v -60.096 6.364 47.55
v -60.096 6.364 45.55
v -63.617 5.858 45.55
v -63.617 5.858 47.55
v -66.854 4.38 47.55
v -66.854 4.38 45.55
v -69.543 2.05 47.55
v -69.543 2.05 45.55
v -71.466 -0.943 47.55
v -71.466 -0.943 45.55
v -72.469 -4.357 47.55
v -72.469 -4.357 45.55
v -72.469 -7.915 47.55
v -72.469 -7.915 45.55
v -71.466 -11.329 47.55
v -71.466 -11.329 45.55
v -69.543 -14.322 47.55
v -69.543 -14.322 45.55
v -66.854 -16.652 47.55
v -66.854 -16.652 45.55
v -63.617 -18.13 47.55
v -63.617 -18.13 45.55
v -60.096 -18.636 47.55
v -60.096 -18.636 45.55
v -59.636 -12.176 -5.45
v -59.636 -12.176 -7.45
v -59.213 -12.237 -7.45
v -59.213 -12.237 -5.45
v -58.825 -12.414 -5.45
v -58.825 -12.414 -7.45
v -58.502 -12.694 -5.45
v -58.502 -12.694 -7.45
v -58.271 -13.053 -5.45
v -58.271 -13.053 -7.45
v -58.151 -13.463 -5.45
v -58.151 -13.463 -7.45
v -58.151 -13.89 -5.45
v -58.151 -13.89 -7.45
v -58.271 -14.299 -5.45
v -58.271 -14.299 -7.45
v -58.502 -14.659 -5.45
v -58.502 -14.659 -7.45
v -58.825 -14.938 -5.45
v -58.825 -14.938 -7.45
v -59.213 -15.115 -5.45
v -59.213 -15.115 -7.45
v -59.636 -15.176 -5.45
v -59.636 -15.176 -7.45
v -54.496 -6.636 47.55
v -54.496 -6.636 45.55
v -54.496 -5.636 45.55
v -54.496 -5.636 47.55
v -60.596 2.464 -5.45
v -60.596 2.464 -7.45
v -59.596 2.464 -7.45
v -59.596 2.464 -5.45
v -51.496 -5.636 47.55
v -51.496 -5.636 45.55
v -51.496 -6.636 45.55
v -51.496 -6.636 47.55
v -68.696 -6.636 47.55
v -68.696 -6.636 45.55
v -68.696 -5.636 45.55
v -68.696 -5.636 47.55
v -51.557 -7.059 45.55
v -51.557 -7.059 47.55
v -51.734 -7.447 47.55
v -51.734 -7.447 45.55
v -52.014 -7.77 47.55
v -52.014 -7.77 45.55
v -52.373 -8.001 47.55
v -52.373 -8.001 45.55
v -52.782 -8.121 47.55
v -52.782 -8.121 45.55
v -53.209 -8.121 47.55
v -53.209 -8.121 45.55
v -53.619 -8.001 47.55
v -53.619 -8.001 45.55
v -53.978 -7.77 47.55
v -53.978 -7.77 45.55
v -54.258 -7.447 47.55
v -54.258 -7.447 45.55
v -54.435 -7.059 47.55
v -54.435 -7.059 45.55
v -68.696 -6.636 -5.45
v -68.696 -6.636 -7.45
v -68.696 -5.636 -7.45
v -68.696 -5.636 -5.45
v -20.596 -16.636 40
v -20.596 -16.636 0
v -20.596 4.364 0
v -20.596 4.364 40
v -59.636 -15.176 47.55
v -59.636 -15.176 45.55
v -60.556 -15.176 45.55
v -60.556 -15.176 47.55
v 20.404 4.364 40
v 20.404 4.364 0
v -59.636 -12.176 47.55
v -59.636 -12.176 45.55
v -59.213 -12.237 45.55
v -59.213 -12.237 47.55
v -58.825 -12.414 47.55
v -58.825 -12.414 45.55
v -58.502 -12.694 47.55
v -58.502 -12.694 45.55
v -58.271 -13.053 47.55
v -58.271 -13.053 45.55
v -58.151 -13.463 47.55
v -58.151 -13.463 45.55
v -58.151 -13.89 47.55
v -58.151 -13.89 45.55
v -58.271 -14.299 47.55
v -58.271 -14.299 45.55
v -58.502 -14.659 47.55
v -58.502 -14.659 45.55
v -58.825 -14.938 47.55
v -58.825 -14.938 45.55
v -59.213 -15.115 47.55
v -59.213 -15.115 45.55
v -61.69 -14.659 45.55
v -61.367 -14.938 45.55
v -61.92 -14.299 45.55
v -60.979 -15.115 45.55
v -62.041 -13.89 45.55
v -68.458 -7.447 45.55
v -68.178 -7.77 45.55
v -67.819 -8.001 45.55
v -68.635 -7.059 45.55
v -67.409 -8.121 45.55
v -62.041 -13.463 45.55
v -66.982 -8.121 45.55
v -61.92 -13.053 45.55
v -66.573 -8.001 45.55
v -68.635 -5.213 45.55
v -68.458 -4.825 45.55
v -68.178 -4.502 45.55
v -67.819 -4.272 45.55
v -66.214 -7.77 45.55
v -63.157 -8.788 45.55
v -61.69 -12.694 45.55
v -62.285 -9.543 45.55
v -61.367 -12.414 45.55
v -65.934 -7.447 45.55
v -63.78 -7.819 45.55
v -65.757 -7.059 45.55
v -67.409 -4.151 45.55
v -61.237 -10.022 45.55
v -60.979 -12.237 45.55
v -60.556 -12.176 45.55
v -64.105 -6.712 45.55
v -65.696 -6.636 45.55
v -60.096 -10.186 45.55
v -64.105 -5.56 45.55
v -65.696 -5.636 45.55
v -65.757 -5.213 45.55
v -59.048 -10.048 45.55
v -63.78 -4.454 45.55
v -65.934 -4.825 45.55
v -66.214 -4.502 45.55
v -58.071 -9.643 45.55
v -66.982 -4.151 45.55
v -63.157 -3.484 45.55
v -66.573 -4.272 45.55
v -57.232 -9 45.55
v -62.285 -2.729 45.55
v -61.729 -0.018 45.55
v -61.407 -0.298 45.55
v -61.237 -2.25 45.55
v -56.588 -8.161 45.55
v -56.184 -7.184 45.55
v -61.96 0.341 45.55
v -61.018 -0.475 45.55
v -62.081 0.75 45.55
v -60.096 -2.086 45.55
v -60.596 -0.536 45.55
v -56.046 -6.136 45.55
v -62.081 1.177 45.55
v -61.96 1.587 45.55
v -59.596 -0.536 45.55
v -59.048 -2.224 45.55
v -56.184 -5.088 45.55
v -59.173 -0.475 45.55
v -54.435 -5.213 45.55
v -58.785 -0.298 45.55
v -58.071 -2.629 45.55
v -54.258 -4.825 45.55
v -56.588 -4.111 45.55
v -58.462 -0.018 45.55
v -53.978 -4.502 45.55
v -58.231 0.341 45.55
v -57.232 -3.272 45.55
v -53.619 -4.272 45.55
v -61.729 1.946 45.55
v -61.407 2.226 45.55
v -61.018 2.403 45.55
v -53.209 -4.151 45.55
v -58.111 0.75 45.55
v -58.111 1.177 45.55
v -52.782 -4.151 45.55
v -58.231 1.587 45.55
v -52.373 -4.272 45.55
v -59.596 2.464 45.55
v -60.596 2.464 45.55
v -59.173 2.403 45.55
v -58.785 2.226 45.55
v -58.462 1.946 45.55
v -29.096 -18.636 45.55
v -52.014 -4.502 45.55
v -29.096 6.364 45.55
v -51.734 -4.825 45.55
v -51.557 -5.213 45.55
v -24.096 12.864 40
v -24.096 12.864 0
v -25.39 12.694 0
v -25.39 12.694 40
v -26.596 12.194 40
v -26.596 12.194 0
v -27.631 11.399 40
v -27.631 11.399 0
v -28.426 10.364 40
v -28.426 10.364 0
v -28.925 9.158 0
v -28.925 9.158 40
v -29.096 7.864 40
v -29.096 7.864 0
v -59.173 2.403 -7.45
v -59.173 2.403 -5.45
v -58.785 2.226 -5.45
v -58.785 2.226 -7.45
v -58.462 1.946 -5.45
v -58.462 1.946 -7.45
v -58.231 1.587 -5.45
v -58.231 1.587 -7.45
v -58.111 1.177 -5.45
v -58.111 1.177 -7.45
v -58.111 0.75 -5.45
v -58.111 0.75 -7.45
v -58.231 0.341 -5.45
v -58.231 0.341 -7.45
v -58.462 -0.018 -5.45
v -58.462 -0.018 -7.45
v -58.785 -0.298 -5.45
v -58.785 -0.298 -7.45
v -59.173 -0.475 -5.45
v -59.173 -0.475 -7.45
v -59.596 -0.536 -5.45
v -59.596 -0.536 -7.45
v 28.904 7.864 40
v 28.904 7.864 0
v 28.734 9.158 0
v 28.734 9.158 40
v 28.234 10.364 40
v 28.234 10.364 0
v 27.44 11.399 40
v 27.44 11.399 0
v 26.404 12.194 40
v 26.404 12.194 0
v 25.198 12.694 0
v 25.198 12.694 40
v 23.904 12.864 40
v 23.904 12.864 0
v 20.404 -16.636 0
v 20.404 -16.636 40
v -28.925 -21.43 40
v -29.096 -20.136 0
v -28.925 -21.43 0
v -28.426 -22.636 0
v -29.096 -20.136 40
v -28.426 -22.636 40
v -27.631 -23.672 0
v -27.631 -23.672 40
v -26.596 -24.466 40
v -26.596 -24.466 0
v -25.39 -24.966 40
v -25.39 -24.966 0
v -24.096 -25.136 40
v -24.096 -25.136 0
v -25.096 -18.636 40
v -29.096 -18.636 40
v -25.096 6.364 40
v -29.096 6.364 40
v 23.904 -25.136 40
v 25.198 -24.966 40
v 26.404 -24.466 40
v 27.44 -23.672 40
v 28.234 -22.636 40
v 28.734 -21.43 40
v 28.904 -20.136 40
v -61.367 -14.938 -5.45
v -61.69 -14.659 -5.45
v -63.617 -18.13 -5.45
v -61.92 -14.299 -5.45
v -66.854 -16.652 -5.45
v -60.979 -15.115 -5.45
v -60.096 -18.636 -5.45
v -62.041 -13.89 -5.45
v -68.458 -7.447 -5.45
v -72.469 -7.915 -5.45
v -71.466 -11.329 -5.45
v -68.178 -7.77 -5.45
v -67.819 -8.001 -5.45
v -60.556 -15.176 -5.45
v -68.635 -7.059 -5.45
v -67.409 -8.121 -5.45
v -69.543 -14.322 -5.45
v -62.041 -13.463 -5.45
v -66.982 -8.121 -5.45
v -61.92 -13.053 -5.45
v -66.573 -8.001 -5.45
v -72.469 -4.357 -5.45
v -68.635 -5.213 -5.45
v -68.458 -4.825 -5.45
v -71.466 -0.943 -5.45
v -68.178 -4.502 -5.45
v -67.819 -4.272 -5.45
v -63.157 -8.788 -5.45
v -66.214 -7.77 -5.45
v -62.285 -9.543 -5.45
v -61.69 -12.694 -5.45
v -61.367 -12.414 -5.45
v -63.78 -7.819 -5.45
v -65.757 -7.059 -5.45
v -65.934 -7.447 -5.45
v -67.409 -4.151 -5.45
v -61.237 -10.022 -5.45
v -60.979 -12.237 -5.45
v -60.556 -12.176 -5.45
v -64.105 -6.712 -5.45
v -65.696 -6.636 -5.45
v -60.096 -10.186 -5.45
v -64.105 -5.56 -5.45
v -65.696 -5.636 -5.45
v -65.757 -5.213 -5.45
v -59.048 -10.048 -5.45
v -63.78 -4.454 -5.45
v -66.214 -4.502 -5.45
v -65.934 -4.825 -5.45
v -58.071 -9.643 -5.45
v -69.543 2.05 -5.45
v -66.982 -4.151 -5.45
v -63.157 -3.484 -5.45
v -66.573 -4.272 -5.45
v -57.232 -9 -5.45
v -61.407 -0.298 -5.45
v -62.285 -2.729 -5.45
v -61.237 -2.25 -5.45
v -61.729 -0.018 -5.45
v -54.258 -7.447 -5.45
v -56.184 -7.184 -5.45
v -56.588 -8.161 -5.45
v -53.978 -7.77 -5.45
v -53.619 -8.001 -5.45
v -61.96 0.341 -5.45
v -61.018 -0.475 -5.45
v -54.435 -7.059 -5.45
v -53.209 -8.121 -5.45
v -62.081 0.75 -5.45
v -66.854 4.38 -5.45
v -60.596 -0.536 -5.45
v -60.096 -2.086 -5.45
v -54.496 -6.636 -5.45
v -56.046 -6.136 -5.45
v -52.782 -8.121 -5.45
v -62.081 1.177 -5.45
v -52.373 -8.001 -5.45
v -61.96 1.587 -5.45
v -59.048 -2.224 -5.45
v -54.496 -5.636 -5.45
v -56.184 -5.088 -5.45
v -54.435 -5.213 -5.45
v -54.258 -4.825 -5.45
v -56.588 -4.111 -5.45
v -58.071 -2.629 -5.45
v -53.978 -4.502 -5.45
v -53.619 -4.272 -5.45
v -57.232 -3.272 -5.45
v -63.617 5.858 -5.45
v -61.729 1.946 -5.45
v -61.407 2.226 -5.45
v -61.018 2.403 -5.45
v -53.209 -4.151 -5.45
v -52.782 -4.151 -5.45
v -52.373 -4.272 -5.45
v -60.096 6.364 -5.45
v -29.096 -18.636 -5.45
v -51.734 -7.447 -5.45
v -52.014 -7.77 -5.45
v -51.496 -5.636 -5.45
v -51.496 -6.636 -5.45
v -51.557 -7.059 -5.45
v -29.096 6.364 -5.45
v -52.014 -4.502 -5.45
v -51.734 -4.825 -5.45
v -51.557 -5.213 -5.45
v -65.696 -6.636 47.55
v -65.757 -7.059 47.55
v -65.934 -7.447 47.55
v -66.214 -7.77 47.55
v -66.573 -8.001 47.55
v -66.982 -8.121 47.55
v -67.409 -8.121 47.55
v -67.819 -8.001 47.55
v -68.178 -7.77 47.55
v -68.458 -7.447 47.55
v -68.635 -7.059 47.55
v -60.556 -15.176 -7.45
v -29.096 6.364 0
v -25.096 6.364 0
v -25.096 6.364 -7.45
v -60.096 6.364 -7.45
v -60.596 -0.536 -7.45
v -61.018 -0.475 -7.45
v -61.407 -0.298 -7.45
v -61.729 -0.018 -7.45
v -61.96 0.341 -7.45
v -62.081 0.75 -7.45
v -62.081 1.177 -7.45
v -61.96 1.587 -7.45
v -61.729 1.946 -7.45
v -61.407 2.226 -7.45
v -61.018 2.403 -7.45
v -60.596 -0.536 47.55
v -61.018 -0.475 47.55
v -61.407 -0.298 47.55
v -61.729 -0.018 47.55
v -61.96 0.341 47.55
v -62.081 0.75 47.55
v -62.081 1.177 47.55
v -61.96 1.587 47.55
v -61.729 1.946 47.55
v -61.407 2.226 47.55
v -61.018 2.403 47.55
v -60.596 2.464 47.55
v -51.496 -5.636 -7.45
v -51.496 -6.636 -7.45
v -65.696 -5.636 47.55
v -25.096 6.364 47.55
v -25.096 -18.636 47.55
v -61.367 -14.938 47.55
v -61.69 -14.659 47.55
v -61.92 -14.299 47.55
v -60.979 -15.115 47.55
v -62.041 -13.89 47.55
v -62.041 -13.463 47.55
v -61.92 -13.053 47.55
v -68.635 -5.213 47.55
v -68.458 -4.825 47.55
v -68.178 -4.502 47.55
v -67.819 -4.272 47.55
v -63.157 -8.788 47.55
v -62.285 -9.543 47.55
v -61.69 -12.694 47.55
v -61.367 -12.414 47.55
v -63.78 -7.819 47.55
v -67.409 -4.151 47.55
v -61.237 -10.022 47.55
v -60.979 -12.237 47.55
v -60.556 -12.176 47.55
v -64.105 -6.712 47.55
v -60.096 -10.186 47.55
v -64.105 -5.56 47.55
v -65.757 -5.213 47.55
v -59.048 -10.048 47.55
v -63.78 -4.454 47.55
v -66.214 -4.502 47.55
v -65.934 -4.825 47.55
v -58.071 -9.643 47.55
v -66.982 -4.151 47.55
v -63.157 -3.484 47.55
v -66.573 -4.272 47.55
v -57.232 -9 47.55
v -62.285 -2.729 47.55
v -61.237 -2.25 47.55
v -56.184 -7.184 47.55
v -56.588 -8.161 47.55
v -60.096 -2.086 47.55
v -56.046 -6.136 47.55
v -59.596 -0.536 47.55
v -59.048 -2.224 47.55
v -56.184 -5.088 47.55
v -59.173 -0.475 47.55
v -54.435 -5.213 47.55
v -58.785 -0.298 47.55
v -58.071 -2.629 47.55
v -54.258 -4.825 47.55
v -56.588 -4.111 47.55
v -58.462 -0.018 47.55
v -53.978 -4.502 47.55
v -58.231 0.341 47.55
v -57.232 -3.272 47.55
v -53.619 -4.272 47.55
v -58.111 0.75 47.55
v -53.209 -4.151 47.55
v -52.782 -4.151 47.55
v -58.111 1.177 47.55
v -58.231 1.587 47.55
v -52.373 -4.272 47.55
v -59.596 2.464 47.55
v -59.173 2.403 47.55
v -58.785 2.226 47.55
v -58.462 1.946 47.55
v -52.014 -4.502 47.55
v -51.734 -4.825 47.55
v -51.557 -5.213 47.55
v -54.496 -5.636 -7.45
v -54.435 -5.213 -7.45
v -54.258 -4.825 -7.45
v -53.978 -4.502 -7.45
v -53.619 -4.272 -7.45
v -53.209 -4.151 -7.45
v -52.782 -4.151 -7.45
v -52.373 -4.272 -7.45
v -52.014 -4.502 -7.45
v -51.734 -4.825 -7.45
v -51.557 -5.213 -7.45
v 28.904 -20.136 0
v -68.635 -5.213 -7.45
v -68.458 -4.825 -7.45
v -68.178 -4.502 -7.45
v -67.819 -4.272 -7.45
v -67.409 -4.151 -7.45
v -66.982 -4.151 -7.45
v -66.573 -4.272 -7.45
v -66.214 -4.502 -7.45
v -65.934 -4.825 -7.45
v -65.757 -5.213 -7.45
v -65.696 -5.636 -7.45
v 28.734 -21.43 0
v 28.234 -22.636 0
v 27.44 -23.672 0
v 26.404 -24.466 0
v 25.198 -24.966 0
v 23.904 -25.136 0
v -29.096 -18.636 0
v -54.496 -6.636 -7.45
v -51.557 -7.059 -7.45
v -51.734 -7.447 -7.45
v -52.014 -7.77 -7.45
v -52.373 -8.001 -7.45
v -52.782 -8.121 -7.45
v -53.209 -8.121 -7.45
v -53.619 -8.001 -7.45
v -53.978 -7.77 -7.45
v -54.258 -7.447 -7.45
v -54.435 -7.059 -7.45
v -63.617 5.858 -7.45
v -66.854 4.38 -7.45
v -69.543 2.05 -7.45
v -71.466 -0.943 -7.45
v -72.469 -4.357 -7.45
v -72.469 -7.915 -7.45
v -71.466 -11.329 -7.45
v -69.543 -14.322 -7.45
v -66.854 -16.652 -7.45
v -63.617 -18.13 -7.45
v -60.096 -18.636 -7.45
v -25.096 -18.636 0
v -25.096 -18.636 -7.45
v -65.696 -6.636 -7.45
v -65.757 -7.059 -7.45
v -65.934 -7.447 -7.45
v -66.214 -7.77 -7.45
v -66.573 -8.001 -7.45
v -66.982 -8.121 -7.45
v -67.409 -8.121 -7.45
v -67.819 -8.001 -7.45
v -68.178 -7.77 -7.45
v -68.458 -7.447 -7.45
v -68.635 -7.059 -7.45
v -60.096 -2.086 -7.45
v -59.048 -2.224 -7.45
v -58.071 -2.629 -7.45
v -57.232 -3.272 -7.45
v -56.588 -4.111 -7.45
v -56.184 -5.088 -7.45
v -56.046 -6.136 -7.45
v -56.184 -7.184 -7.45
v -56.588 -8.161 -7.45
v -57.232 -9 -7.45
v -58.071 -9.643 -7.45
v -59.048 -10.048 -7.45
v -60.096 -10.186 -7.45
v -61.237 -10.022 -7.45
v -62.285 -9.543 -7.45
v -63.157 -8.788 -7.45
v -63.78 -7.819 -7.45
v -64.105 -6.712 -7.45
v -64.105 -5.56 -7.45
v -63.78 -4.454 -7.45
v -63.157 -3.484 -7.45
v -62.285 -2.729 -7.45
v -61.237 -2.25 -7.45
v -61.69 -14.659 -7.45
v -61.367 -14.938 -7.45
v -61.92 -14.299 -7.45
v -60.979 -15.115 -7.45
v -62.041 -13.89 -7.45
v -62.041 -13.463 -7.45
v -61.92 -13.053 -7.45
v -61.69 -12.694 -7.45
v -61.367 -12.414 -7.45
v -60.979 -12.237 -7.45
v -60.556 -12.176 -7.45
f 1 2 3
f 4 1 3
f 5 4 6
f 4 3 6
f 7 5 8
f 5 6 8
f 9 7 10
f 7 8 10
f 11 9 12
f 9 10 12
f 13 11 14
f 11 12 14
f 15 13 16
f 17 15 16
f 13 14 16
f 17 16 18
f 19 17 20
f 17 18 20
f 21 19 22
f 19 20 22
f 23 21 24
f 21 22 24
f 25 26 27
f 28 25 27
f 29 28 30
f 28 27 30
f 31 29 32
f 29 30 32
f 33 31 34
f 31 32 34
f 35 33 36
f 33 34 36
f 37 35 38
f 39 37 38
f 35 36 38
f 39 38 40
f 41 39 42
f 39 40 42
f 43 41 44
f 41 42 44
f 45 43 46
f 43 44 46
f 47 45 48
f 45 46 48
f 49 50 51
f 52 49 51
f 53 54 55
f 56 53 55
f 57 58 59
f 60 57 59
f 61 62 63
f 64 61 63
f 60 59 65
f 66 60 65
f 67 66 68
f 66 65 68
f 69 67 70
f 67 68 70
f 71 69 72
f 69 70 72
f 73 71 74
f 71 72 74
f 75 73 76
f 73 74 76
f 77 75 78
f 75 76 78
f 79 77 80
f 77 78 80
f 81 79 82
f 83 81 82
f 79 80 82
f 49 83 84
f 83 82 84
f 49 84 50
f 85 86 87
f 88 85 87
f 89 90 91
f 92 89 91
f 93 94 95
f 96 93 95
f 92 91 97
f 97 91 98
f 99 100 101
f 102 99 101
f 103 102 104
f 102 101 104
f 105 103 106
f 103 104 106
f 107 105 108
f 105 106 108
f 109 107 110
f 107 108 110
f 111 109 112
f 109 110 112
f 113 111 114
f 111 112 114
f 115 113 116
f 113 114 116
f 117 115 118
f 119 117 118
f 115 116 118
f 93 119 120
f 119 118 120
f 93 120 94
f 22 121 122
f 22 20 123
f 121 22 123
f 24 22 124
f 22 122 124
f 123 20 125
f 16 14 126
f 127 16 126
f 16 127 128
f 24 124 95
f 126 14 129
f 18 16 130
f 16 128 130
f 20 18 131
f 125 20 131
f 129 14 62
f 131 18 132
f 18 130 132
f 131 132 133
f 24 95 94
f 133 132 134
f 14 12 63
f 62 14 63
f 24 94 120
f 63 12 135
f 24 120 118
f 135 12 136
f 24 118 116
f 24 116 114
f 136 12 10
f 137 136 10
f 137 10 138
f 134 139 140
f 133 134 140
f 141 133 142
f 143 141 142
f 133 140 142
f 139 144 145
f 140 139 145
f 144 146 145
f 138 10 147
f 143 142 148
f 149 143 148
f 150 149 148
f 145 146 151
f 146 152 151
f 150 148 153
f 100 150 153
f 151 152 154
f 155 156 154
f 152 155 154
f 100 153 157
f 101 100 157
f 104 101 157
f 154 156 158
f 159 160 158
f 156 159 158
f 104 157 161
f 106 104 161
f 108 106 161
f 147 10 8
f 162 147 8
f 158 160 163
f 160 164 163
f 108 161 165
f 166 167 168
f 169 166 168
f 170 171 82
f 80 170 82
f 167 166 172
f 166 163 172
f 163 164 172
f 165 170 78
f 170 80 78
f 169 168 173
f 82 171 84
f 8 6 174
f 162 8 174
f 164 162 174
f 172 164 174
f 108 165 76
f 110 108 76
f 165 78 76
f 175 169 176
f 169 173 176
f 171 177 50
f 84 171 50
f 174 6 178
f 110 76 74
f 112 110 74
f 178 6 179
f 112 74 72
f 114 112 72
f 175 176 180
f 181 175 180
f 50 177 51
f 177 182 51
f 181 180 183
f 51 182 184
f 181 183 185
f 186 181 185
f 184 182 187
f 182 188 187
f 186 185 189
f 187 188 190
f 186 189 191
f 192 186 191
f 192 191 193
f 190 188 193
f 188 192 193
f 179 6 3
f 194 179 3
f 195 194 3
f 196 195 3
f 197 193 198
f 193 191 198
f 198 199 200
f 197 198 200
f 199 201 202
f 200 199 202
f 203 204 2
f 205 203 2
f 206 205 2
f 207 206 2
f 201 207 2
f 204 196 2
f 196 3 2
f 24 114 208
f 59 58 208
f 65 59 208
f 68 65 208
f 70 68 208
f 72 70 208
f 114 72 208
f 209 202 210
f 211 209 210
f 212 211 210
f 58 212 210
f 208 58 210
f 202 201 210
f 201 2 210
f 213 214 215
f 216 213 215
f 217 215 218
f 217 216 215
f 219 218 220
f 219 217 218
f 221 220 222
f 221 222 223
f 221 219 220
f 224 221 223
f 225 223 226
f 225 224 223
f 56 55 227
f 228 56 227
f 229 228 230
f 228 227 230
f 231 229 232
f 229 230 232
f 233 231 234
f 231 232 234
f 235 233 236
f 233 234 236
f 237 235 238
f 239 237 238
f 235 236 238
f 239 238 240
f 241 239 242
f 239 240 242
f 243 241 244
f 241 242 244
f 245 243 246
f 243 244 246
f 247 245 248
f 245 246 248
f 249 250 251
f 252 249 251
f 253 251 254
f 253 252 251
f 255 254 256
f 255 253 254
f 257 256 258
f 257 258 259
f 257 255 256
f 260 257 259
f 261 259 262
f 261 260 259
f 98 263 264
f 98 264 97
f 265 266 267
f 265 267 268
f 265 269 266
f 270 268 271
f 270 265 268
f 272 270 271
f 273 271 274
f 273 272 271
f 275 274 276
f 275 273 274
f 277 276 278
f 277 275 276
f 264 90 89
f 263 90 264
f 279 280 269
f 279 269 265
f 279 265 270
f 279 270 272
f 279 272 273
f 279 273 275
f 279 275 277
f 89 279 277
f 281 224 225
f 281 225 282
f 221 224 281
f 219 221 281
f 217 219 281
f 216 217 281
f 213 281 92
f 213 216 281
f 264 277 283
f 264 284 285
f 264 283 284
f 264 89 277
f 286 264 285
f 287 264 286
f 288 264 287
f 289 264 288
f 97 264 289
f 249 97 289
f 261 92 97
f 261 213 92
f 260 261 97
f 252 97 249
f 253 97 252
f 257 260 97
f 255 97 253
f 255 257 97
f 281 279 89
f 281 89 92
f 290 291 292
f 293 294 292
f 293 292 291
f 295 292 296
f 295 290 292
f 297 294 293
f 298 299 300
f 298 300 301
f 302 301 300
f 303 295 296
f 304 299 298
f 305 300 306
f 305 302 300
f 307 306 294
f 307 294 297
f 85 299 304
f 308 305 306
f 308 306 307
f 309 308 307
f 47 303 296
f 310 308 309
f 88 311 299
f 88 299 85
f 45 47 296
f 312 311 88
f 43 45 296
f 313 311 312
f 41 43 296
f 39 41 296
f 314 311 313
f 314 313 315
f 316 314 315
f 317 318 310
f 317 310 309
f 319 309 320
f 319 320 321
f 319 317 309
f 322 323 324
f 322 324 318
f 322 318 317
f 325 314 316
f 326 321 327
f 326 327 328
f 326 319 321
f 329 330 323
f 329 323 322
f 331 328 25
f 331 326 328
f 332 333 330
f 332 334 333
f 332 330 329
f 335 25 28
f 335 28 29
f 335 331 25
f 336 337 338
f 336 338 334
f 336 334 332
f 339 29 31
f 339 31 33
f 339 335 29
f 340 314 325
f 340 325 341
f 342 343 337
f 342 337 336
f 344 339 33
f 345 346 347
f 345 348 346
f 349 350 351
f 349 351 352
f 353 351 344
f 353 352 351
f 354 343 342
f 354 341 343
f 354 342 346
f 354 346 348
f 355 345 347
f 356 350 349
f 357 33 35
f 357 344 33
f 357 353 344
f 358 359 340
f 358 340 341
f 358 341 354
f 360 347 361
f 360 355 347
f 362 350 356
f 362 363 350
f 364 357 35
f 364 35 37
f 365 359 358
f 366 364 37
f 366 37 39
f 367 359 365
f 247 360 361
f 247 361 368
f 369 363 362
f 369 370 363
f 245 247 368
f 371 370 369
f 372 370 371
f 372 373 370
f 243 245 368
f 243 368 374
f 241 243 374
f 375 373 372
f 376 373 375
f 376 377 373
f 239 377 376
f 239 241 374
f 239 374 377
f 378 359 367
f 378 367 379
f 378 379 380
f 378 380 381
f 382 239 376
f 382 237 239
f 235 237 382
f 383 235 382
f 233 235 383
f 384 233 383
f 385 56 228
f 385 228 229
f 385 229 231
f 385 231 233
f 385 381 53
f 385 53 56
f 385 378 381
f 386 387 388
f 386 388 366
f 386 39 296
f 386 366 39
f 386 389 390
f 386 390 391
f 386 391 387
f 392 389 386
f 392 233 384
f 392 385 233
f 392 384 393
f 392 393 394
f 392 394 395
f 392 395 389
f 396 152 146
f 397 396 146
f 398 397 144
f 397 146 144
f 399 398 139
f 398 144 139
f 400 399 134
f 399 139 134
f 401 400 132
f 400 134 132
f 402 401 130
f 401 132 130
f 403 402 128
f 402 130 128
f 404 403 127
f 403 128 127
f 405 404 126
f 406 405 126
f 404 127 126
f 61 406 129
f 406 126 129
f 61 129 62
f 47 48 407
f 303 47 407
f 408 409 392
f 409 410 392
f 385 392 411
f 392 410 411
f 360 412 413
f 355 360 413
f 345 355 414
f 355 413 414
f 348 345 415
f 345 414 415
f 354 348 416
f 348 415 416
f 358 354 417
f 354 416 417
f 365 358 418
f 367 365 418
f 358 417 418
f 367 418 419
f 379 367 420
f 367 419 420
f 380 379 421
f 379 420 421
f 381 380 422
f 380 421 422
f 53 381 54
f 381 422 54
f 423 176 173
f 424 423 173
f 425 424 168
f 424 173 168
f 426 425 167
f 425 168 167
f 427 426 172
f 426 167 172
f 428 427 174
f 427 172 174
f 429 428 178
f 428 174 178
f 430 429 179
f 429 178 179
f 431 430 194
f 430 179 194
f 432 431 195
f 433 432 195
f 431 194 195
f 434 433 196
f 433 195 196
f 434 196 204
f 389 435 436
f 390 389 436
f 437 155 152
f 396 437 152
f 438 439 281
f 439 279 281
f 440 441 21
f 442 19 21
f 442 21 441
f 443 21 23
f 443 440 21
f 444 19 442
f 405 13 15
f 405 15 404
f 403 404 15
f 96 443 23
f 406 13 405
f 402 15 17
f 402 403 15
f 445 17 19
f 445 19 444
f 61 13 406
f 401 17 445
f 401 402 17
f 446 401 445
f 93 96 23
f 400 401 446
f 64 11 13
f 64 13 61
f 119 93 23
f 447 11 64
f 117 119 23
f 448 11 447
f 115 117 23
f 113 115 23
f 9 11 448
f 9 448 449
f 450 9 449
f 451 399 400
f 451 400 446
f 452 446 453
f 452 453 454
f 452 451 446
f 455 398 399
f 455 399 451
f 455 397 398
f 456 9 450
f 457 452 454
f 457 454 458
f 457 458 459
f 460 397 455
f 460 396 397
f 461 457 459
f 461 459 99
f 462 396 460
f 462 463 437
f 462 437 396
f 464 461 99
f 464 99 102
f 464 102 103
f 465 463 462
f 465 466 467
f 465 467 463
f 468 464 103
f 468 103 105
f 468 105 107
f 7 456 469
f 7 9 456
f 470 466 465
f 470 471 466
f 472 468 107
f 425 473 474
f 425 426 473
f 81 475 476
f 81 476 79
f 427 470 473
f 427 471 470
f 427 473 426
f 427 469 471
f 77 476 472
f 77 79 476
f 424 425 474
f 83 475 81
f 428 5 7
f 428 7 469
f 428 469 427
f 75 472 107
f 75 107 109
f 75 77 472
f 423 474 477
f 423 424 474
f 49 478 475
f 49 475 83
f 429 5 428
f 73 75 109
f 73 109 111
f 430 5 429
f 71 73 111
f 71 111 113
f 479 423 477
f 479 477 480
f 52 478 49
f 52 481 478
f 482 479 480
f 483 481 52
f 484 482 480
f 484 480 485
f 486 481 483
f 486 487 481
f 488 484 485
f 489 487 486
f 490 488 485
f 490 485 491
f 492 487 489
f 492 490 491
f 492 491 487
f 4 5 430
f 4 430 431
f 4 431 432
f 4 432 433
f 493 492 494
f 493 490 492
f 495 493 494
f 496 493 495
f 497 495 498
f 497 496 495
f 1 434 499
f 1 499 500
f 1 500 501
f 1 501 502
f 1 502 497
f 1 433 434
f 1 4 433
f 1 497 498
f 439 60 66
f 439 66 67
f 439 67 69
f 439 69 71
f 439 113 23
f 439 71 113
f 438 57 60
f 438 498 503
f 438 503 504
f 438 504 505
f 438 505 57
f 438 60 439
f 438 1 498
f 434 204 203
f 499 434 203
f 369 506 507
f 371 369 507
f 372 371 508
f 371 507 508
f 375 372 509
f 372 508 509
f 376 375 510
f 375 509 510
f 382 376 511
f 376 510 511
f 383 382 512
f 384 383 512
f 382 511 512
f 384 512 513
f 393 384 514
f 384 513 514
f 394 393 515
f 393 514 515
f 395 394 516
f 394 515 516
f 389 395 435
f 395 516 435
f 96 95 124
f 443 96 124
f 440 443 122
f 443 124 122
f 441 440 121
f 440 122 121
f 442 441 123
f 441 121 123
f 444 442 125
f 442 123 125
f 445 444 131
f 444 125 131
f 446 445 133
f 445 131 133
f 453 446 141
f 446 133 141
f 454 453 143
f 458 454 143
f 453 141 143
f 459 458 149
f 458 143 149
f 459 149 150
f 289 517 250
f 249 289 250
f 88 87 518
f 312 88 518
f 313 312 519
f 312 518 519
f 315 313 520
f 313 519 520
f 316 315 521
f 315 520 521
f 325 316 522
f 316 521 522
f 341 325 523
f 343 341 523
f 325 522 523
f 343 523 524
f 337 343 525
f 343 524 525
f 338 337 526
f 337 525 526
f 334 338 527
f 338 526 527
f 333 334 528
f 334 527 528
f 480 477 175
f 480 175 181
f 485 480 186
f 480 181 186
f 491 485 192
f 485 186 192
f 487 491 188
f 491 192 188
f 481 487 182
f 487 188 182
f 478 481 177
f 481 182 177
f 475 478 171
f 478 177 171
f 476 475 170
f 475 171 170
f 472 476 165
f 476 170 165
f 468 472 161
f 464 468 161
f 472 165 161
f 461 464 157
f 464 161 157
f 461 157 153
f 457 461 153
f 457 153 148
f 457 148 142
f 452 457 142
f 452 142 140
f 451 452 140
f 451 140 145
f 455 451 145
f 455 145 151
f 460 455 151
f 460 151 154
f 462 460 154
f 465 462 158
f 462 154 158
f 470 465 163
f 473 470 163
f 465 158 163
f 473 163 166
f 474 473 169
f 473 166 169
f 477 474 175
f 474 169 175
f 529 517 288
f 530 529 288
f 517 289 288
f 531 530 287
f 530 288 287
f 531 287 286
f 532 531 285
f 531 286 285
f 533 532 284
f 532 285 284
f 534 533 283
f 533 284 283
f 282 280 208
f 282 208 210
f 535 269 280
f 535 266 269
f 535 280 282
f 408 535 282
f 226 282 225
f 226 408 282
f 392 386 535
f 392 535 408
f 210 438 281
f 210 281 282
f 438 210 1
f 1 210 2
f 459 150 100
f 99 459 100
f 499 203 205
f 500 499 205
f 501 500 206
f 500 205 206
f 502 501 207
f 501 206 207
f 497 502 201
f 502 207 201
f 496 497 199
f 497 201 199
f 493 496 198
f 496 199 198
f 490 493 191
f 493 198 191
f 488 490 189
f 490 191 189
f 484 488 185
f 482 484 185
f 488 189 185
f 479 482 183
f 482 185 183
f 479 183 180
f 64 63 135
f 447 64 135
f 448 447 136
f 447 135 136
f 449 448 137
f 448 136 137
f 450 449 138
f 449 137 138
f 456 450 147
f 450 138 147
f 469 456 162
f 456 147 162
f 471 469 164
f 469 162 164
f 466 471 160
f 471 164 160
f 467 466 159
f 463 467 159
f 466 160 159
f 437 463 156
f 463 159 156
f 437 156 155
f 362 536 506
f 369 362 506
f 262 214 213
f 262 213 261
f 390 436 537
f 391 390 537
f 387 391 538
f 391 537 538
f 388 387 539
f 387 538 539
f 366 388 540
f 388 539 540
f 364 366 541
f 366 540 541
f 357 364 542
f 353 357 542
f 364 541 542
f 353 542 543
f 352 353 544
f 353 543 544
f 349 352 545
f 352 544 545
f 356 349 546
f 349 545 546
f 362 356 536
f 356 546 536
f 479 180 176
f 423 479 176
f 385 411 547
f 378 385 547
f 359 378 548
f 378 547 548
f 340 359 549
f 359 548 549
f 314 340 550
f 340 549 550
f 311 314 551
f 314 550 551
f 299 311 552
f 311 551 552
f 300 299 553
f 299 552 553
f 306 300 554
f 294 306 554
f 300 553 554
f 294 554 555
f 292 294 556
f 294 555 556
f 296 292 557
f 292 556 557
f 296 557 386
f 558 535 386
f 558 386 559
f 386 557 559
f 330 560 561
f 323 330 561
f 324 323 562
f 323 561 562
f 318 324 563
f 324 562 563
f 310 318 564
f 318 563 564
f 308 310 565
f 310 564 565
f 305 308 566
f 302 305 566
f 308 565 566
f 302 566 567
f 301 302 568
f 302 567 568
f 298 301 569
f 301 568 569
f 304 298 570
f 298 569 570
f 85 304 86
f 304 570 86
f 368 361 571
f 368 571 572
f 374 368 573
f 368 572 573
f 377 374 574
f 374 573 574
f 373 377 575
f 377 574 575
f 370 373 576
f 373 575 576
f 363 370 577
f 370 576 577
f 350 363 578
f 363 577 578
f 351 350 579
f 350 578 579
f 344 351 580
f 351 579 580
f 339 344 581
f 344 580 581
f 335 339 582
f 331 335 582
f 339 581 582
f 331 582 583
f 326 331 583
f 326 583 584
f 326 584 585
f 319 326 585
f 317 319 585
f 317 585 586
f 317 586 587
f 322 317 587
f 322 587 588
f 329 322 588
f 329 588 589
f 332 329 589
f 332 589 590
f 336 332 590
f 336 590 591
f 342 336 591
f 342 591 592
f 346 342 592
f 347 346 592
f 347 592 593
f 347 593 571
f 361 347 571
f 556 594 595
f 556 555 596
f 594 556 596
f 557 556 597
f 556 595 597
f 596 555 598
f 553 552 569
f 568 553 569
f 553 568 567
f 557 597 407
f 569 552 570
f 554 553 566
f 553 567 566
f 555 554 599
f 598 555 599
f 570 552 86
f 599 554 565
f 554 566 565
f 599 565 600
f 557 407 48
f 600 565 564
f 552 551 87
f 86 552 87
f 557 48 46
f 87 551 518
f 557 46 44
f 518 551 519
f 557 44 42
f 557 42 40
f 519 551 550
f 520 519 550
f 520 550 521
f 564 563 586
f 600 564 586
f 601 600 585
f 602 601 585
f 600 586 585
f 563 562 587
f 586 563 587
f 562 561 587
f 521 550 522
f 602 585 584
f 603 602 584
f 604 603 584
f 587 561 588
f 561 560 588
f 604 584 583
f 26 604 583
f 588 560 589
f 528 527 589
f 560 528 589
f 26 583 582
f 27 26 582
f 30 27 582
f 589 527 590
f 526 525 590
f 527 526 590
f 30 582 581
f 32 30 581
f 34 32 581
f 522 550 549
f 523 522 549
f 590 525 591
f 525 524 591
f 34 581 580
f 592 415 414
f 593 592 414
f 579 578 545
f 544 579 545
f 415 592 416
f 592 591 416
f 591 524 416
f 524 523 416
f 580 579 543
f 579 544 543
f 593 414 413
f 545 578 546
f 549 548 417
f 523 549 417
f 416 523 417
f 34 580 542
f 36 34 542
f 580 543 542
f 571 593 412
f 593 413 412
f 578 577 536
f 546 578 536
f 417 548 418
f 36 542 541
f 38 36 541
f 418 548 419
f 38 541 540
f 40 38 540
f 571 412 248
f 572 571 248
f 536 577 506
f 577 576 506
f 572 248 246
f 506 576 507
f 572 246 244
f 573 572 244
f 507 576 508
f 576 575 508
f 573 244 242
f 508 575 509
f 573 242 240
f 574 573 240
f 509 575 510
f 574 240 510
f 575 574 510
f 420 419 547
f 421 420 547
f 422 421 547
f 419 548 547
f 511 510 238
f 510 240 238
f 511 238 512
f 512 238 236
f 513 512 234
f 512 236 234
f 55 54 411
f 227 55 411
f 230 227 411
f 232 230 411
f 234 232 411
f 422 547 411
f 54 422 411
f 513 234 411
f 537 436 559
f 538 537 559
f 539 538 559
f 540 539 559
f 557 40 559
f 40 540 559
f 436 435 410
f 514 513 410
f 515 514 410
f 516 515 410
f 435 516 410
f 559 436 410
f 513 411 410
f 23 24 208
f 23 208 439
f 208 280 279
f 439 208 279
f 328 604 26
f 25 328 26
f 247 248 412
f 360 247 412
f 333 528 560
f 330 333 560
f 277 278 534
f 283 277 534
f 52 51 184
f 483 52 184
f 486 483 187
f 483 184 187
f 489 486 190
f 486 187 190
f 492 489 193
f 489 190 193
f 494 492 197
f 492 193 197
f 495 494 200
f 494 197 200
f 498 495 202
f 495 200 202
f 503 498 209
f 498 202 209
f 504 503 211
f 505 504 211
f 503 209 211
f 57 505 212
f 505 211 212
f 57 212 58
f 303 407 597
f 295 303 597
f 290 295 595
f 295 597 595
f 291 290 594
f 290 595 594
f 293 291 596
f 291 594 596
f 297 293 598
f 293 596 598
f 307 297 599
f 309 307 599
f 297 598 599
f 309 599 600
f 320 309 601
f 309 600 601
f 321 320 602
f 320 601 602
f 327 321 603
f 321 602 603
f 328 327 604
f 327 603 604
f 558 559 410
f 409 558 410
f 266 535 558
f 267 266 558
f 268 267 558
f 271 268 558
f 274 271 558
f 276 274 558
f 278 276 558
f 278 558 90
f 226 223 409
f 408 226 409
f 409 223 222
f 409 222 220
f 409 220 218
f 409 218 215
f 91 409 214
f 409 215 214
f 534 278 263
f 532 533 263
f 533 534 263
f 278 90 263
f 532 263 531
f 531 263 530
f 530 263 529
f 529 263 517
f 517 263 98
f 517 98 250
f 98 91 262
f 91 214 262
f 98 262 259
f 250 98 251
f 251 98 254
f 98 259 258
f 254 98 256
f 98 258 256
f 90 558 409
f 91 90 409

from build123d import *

# Parameters (mm, degrees)
SKETCH1_W           = 58
SKETCH1_H           = 38
SKETCH1_W_2         = 41
SKETCH1_H_2         = 21
BOSS_EXTRUDE1_DEPTH = 40
SKETCH2_W           = 4
SKETCH2_H           = 25
BOSS_EXTRUDE2_DEPTH = 5.55
SKETCH2_2_W         = 4
SKETCH2_2_H         = 25
BOSS_EXTRUDE3_DEPTH = 45.55
SKETCH3_R           = 4.05
BOSS_EXTRUDE6_DEPTH = 2
BOSS_EXTRUDE7_START = -53
SKETCH3_8_R         = 4.05
BOSS_EXTRUDE7_DEPTH = 53
CUT_EXTRUDE1_START  = -51
SKETCH3_11_R        = 4.05
CUT_EXTRUDE1_DEPTH  = 51
FILLET2_R           = 5
FILLET3_R           = 5
FILLET4_R           = 5
FILLET5_R           = 5


with BuildPart() as part:
    # Sketch1 → Boss-Extrude1 (new body)
    with BuildSketch(Plane.XY):
        with Locations((-0.095837804, -6.136072895)):
            Rectangle(SKETCH1_W, SKETCH1_H)
        with Locations((-0.095837804, -6.136072895)):
            Rectangle(SKETCH1_W_2, SKETCH1_H_2, mode=Mode.SUBTRACT)
    extrude(amount=BOSS_EXTRUDE1_DEPTH)

    # Sketch2 → Boss-Extrude2 (add)
    with BuildSketch(Plane.XY.offset(40)):
        with Locations((-27.095837804, -6.136072895)):
            Rectangle(SKETCH2_W, SKETCH2_H)
    extrude(amount=BOSS_EXTRUDE2_DEPTH)

    # Sketch2<2> → Boss-Extrude3 (add)
    with BuildSketch(Plane.XY.offset(40)):
        with Locations((-27.095837804, -6.136072895)):
            Rectangle(SKETCH2_2_W, SKETCH2_2_H)
    extrude(amount=-BOSS_EXTRUDE3_DEPTH)

    # Sketch3 → Boss-Extrude6 (add)
    with BuildSketch(Plane.XY.offset(45.55)):
        with BuildLine():
            Line((-25.095837804, -18.636072895), (-25.095837804, 6.363927105))
            Line((-25.095837804, 6.363927105), (-60.095837804, 6.363927105))
            ThreePointArc((-60.095837804, 6.363927105), (-72.595837804, -6.136072895), (-60.095837804, -18.636072895))
            Line((-60.095837804, -18.636072895), (-25.095837804, -18.636072895))
        make_face()
        with BuildLine():
            Line((-51.495837804, -5.636072895), (-51.495837804, -6.636072895))
            ThreePointArc((-51.495837804, -6.636072895), (-52.995837804, -8.136072895), (-54.495837804, -6.636072895))
            Line((-54.495837804, -6.636072895), (-54.495837804, -5.636072895))
            ThreePointArc((-54.495837804, -5.636072895), (-52.995837804, -4.136072895), (-51.495837804, -5.636072895))
        make_face(mode=Mode.SUBTRACT)
        with BuildLine():
            Line((-59.635749439, -15.176248856), (-60.555926168, -15.176248856))
            ThreePointArc((-60.555926168, -15.176248856), (-62.055926168, -13.676248856), (-60.555926168, -12.176248856))
            Line((-60.555926168, -12.176248856), (-59.635749439, -12.176248856))
            ThreePointArc((-59.635749439, -12.176248856), (-58.135749439, -13.676248856), (-59.635749439, -15.176248856))
        make_face(mode=Mode.SUBTRACT)
        with Locations((-60.095837804, -6.136072895)):
            Circle(SKETCH3_R, mode=Mode.SUBTRACT)
        with BuildLine():
            Line((-59.595837804, -0.536072895), (-60.595837804, -0.536072895))
            ThreePointArc((-60.595837804, -0.536072895), (-62.095837804, 0.963927105), (-60.595837804, 2.463927105))
            Line((-60.595837804, 2.463927105), (-59.595837804, 2.463927105))
            ThreePointArc((-59.595837804, 2.463927105), (-58.095837804, 0.963927105), (-59.595837804, -0.536072895))
        make_face(mode=Mode.SUBTRACT)
        with BuildLine():
            ThreePointArc((-68.695837804, -5.636072895), (-67.195837804, -4.136072895), (-65.695837804, -5.636072895))
            Line((-65.695837804, -5.636072895), (-65.695837804, -6.636072895))
            ThreePointArc((-65.695837804, -6.636072895), (-67.195837804, -8.136072895), (-68.695837804, -6.636072895))
            Line((-68.695837804, -6.636072895), (-68.695837804, -5.636072895))
        make_face(mode=Mode.SUBTRACT)
    extrude(amount=BOSS_EXTRUDE6_DEPTH)

    # Sketch3<8> → Boss-Extrude7 (add)
    with BuildSketch(Plane.XY.offset(45.55).offset(BOSS_EXTRUDE7_START)):
        with BuildLine():
            Line((-25.095837804, -18.636072895), (-25.095837804, 6.363927105))
            Line((-25.095837804, 6.363927105), (-60.095837804, 6.363927105))
            ThreePointArc((-60.095837804, 6.363927105), (-72.595837804, -6.136072895), (-60.095837804, -18.636072895))
            Line((-60.095837804, -18.636072895), (-25.095837804, -18.636072895))
        make_face()
        with BuildLine():
            Line((-51.495837804, -5.636072895), (-51.495837804, -6.636072895))
            ThreePointArc((-51.495837804, -6.636072895), (-52.995837804, -8.136072895), (-54.495837804, -6.636072895))
            Line((-54.495837804, -6.636072895), (-54.495837804, -5.636072895))
            ThreePointArc((-54.495837804, -5.636072895), (-52.995837804, -4.136072895), (-51.495837804, -5.636072895))
        make_face(mode=Mode.SUBTRACT)
        with BuildLine():
            Line((-59.635749439, -15.176248856), (-60.555926168, -15.176248856))
            ThreePointArc((-60.555926168, -15.176248856), (-62.055926168, -13.676248856), (-60.555926168, -12.176248856))
            Line((-60.555926168, -12.176248856), (-59.635749439, -12.176248856))
            ThreePointArc((-59.635749439, -12.176248856), (-58.135749439, -13.676248856), (-59.635749439, -15.176248856))
        make_face(mode=Mode.SUBTRACT)
        with Locations((-60.095837804, -6.136072895)):
            Circle(SKETCH3_8_R, mode=Mode.SUBTRACT)
        with BuildLine():
            Line((-59.595837804, -0.536072895), (-60.595837804, -0.536072895))
            ThreePointArc((-60.595837804, -0.536072895), (-62.095837804, 0.963927105), (-60.595837804, 2.463927105))
            Line((-60.595837804, 2.463927105), (-59.595837804, 2.463927105))
            ThreePointArc((-59.595837804, 2.463927105), (-58.095837804, 0.963927105), (-59.595837804, -0.536072895))
        make_face(mode=Mode.SUBTRACT)
        with BuildLine():
            ThreePointArc((-68.695837804, -5.636072895), (-67.195837804, -4.136072895), (-65.695837804, -5.636072895))
            Line((-65.695837804, -5.636072895), (-65.695837804, -6.636072895))
            ThreePointArc((-65.695837804, -6.636072895), (-67.195837804, -8.136072895), (-68.695837804, -6.636072895))
            Line((-68.695837804, -6.636072895), (-68.695837804, -5.636072895))
        make_face(mode=Mode.SUBTRACT)
    extrude(amount=BOSS_EXTRUDE7_DEPTH)

    # Sketch3<11> → Cut-Extrude1 (cut)
    with BuildSketch(Plane.XY.offset(45.55).offset(CUT_EXTRUDE1_START)):
        with BuildLine():
            Line((-29.095837804, -18.636072895), (-29.095837804, 6.363927105))
            Line((-29.095837804, 6.363927105), (-60.095837804, 6.363927105))
            ThreePointArc((-60.095837804, 6.363927105), (-72.595837804, -6.136072895), (-60.095837804, -18.636072895))
            Line((-60.095837804, -18.636072895), (-29.095837804, -18.636072895))
        make_face()
        with BuildLine():
            Line((-59.635749439, -15.176248856), (-60.555926168, -15.176248856))
            ThreePointArc((-60.555926168, -15.176248856), (-62.055926168, -13.676248856), (-60.555926168, -12.176248856))
            Line((-60.555926168, -12.176248856), (-59.635749439, -12.176248856))
            ThreePointArc((-59.635749439, -12.176248856), (-58.135749439, -13.676248856), (-59.635749439, -15.176248856))
        make_face(mode=Mode.SUBTRACT)
        with Locations((-60.095837804, -6.136072895)):
            Circle(SKETCH3_11_R, mode=Mode.SUBTRACT)
        with BuildLine():
            Line((-59.595837804, -0.536072895), (-60.595837804, -0.536072895))
            ThreePointArc((-60.595837804, -0.536072895), (-62.095837804, 0.963927105), (-60.595837804, 2.463927105))
            Line((-60.595837804, 2.463927105), (-59.595837804, 2.463927105))
            ThreePointArc((-59.595837804, 2.463927105), (-58.095837804, 0.963927105), (-59.595837804, -0.536072895))
        make_face(mode=Mode.SUBTRACT)
        with BuildLine():
            ThreePointArc((-54.495837804, -5.636072895), (-52.995837804, -4.136072895), (-51.495837804, -5.636072895))
            Line((-51.495837804, -5.636072895), (-51.495837804, -6.636072895))
            ThreePointArc((-51.495837804, -6.636072895), (-52.995837804, -8.136072895), (-54.495837804, -6.636072895))
            Line((-54.495837804, -6.636072895), (-54.495837804, -5.636072895))
        make_face(mode=Mode.SUBTRACT)
        with BuildLine():
            ThreePointArc((-68.695837804, -5.636072895), (-67.195837804, -4.136072895), (-65.695837804, -5.636072895))
            Line((-65.695837804, -5.636072895), (-65.695837804, -6.636072895))
            ThreePointArc((-65.695837804, -6.636072895), (-67.195837804, -8.136072895), (-68.695837804, -6.636072895))
            Line((-68.695837804, -6.636072895), (-68.695837804, -5.636072895))
        make_face(mode=Mode.SUBTRACT)
    extrude(amount=CUT_EXTRUDE1_DEPTH, mode=Mode.SUBTRACT)

    # Fillet2
    fillet2_edges = [part.edges().sort_by_distance(p)[0] for p in [
        (28.904162196, 12.863927105, 20),
    ]]
    fillet(fillet2_edges, radius=FILLET2_R)

    # Fillet3
    fillet3_edges = [part.edges().sort_by_distance(p)[0] for p in [
        (28.904162196, -25.136072895, 20),
    ]]
    fillet(fillet3_edges, radius=FILLET3_R)

    # Fillet4
    fillet4_edges = [part.edges().sort_by_distance(p)[0] for p in [
        (-29.095837804, 12.863927105, 20),
    ]]
    fillet(fillet4_edges, radius=FILLET4_R)

    # Fillet5
    fillet5_edges = [part.edges().sort_by_distance(p)[0] for p in [
        (-29.095837804, -25.136072895, 20),
    ]]
    fillet(fillet5_edges, radius=FILLET5_R)


solid = part.part
